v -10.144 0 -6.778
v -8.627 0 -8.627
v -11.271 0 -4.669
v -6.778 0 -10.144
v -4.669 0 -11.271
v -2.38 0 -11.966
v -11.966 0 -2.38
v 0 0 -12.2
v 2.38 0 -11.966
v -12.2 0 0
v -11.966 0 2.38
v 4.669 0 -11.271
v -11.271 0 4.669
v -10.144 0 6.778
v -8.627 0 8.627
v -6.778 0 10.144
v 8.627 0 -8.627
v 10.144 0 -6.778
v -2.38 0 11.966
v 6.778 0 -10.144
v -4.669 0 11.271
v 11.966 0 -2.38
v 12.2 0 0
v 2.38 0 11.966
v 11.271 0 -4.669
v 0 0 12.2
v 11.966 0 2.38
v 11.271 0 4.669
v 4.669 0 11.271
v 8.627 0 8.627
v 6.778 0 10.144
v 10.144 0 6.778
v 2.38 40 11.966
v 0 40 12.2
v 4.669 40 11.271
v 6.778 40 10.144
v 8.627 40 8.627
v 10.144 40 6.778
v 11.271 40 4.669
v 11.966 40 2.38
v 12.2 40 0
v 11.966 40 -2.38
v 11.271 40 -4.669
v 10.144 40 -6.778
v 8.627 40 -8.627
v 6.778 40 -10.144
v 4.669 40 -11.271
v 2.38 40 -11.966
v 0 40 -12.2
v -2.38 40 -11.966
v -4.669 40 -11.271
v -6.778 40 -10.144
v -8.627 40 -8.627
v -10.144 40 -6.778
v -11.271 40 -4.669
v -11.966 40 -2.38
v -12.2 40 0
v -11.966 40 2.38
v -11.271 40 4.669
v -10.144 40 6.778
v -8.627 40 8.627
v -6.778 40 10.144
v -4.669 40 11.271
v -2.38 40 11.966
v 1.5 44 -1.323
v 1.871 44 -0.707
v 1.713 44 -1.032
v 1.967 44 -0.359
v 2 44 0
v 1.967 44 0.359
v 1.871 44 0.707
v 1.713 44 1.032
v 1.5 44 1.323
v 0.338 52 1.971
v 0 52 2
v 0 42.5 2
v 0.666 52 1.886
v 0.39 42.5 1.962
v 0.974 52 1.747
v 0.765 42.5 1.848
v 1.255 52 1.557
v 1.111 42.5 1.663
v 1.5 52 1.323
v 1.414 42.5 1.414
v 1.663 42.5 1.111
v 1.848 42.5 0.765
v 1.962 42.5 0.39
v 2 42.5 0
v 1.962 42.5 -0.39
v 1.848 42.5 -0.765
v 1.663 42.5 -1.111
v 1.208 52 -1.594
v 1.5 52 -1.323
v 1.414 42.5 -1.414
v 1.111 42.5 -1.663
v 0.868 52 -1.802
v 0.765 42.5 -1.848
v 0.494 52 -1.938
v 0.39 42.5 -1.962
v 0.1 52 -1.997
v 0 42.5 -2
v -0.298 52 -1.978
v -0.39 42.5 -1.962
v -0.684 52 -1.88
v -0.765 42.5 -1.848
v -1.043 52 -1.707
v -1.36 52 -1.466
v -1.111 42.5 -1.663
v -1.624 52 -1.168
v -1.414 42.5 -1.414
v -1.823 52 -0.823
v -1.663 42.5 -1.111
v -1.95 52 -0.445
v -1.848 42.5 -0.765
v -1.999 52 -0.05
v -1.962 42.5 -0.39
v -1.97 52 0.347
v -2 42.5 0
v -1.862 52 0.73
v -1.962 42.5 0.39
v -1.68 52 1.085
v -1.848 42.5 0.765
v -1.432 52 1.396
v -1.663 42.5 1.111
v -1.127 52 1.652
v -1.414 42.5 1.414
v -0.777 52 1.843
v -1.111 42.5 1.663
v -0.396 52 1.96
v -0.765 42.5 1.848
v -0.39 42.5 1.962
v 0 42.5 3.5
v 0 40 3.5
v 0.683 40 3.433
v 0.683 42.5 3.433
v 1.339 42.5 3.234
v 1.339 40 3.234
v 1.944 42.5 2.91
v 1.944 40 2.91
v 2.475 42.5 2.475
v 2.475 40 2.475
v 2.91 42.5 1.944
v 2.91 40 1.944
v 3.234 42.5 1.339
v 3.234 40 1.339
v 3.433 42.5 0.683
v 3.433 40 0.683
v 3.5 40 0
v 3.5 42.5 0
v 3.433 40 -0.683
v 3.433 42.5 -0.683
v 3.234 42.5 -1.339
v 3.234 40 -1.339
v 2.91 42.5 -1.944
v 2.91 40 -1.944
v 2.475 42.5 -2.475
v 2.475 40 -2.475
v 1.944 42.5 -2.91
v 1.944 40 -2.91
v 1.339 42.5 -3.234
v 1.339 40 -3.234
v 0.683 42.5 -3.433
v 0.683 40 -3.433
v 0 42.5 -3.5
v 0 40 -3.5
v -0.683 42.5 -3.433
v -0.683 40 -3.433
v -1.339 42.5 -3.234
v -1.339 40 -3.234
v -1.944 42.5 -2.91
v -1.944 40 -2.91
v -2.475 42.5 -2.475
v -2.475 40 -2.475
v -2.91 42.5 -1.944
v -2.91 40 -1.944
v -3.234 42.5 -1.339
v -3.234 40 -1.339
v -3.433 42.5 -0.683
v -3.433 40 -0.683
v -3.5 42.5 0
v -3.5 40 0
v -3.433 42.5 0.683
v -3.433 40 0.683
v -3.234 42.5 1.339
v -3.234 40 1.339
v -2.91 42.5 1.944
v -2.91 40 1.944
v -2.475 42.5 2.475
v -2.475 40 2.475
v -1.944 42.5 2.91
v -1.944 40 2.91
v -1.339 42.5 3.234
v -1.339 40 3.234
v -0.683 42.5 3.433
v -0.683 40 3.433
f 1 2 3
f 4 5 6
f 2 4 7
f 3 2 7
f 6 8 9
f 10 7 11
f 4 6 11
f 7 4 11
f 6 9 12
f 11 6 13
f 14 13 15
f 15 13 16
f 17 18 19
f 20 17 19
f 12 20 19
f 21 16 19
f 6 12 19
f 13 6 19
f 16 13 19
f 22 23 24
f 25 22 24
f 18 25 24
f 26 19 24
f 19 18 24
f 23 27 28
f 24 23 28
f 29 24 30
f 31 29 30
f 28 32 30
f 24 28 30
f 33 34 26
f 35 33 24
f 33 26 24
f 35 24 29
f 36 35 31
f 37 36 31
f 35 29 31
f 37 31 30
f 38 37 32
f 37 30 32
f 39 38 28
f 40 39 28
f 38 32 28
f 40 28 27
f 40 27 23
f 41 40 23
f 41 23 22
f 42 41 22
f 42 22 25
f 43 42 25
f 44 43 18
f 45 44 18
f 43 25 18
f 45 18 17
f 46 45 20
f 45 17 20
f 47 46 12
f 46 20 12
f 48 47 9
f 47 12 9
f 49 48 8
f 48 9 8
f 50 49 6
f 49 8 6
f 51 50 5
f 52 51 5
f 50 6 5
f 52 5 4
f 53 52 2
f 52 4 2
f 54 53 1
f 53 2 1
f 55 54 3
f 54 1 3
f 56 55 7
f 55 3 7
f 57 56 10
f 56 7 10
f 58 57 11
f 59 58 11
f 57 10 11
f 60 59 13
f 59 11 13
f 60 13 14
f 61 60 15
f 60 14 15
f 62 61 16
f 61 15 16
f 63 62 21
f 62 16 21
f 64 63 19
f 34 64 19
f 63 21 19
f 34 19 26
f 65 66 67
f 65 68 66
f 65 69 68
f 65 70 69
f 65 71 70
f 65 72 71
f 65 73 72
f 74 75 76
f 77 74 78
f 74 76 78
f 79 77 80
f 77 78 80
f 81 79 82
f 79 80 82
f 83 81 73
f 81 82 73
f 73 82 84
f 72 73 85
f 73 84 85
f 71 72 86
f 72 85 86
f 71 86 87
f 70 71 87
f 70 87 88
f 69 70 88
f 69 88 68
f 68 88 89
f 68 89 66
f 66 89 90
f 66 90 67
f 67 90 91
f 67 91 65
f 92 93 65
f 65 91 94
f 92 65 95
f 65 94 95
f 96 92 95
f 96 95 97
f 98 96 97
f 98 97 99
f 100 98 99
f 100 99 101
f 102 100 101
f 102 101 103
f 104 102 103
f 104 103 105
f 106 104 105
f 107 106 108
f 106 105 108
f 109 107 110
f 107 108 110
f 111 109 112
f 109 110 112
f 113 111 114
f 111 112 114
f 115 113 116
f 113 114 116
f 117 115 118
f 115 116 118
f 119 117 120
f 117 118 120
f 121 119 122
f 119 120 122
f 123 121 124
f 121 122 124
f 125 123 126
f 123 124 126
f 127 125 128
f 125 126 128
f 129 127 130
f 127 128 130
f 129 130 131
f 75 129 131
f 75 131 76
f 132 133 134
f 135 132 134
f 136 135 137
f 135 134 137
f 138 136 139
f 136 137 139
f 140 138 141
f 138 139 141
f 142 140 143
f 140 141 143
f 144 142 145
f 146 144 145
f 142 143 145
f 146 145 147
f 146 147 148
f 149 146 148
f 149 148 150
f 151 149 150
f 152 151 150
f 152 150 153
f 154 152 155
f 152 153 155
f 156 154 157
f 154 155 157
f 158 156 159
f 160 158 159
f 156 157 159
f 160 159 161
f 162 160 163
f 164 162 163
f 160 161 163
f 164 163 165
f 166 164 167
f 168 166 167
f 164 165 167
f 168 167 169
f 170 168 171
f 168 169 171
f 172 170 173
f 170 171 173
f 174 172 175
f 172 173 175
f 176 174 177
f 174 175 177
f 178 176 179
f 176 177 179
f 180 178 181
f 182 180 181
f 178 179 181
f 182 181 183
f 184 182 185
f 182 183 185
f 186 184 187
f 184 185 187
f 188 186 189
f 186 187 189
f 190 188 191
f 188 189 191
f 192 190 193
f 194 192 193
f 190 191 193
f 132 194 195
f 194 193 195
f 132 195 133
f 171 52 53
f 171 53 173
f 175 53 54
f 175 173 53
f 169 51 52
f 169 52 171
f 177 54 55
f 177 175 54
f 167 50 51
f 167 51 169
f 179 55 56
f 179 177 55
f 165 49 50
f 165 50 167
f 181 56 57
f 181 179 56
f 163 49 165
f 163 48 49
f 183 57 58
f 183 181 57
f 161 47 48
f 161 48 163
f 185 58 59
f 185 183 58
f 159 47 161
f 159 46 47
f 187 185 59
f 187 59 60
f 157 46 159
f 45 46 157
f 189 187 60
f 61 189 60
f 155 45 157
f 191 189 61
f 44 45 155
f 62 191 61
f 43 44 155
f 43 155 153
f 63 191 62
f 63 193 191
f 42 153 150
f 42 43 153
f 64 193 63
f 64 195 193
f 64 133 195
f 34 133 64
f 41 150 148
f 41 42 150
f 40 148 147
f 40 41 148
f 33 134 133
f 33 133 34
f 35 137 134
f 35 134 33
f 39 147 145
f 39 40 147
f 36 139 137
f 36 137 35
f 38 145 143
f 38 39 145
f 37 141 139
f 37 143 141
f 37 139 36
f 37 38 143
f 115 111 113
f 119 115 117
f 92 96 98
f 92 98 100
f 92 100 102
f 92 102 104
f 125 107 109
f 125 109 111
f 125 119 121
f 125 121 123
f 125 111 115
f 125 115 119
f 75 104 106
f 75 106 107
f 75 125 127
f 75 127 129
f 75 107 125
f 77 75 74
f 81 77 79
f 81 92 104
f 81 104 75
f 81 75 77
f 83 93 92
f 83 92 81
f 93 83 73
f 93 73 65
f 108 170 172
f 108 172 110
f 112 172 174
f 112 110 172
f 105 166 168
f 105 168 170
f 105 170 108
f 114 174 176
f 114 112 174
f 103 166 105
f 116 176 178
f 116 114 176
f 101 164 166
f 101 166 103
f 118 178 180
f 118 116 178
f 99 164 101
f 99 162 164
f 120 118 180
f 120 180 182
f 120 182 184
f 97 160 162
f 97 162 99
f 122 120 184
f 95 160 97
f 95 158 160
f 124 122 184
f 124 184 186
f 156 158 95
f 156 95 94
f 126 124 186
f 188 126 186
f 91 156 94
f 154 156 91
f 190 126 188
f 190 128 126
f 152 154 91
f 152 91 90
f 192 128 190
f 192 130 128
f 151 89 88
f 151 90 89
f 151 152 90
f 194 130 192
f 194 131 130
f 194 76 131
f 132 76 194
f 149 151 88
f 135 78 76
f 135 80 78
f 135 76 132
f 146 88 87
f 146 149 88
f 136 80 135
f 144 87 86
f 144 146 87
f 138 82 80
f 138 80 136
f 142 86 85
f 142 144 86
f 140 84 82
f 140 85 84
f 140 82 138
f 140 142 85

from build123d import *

# Parameters (mm, degrees)
SKETCH1_R           = 12.2
BOSS_EXTRUDE1_DEPTH = 40
SKETCH2_R           = 3.5
BOSS_EXTRUDE2_DEPTH = 2.5
SKETCH3_R           = 2
BOSS_EXTRUDE3_DEPTH = 9.5
SKETCH4_W           = 1
SKETCH4_H           = 4
CUT_EXTRUDE1_DEPTH  = 8


with BuildPart() as part:
    # Sketch1 → Boss-Extrude1 (new body)
    with BuildSketch(Plane(origin=(0, 0, 0), x_dir=(1, 0, 0), z_dir=(0, 1, 0))):
        with Locations(Location((0, 0, 0), (0, 0, 270))):
            Circle(SKETCH1_R)
    extrude(amount=BOSS_EXTRUDE1_DEPTH)

    # Sketch2 → Boss-Extrude2 (add)
    with BuildSketch(Plane(origin=(0, 40, 0), x_dir=(1, 0, 0), z_dir=(0, 1, 0))):
        with Locations(Location((0, 0, 0), (0, 0, 270))):
            Circle(SKETCH2_R)
    extrude(amount=BOSS_EXTRUDE2_DEPTH)

    # Sketch3 → Boss-Extrude3 (add)
    with BuildSketch(Plane(origin=(0, 42.5, 0), x_dir=(1, 0, 0), z_dir=(0, 1, 0))):
        with Locations(Location((0, 0, 0), (0, 0, 270))):
            Circle(SKETCH3_R)
    extrude(amount=BOSS_EXTRUDE3_DEPTH)

    # Sketch4 → Cut-Extrude1 (cut)
    with BuildSketch(Plane(origin=(0, 52, 0), x_dir=(1, 0, 0), z_dir=(0, 1, 0))):
        with Locations((2, 0)):
            Rectangle(SKETCH4_W, SKETCH4_H)
    extrude(amount=-CUT_EXTRUDE1_DEPTH, mode=Mode.SUBTRACT)


solid = part.part
